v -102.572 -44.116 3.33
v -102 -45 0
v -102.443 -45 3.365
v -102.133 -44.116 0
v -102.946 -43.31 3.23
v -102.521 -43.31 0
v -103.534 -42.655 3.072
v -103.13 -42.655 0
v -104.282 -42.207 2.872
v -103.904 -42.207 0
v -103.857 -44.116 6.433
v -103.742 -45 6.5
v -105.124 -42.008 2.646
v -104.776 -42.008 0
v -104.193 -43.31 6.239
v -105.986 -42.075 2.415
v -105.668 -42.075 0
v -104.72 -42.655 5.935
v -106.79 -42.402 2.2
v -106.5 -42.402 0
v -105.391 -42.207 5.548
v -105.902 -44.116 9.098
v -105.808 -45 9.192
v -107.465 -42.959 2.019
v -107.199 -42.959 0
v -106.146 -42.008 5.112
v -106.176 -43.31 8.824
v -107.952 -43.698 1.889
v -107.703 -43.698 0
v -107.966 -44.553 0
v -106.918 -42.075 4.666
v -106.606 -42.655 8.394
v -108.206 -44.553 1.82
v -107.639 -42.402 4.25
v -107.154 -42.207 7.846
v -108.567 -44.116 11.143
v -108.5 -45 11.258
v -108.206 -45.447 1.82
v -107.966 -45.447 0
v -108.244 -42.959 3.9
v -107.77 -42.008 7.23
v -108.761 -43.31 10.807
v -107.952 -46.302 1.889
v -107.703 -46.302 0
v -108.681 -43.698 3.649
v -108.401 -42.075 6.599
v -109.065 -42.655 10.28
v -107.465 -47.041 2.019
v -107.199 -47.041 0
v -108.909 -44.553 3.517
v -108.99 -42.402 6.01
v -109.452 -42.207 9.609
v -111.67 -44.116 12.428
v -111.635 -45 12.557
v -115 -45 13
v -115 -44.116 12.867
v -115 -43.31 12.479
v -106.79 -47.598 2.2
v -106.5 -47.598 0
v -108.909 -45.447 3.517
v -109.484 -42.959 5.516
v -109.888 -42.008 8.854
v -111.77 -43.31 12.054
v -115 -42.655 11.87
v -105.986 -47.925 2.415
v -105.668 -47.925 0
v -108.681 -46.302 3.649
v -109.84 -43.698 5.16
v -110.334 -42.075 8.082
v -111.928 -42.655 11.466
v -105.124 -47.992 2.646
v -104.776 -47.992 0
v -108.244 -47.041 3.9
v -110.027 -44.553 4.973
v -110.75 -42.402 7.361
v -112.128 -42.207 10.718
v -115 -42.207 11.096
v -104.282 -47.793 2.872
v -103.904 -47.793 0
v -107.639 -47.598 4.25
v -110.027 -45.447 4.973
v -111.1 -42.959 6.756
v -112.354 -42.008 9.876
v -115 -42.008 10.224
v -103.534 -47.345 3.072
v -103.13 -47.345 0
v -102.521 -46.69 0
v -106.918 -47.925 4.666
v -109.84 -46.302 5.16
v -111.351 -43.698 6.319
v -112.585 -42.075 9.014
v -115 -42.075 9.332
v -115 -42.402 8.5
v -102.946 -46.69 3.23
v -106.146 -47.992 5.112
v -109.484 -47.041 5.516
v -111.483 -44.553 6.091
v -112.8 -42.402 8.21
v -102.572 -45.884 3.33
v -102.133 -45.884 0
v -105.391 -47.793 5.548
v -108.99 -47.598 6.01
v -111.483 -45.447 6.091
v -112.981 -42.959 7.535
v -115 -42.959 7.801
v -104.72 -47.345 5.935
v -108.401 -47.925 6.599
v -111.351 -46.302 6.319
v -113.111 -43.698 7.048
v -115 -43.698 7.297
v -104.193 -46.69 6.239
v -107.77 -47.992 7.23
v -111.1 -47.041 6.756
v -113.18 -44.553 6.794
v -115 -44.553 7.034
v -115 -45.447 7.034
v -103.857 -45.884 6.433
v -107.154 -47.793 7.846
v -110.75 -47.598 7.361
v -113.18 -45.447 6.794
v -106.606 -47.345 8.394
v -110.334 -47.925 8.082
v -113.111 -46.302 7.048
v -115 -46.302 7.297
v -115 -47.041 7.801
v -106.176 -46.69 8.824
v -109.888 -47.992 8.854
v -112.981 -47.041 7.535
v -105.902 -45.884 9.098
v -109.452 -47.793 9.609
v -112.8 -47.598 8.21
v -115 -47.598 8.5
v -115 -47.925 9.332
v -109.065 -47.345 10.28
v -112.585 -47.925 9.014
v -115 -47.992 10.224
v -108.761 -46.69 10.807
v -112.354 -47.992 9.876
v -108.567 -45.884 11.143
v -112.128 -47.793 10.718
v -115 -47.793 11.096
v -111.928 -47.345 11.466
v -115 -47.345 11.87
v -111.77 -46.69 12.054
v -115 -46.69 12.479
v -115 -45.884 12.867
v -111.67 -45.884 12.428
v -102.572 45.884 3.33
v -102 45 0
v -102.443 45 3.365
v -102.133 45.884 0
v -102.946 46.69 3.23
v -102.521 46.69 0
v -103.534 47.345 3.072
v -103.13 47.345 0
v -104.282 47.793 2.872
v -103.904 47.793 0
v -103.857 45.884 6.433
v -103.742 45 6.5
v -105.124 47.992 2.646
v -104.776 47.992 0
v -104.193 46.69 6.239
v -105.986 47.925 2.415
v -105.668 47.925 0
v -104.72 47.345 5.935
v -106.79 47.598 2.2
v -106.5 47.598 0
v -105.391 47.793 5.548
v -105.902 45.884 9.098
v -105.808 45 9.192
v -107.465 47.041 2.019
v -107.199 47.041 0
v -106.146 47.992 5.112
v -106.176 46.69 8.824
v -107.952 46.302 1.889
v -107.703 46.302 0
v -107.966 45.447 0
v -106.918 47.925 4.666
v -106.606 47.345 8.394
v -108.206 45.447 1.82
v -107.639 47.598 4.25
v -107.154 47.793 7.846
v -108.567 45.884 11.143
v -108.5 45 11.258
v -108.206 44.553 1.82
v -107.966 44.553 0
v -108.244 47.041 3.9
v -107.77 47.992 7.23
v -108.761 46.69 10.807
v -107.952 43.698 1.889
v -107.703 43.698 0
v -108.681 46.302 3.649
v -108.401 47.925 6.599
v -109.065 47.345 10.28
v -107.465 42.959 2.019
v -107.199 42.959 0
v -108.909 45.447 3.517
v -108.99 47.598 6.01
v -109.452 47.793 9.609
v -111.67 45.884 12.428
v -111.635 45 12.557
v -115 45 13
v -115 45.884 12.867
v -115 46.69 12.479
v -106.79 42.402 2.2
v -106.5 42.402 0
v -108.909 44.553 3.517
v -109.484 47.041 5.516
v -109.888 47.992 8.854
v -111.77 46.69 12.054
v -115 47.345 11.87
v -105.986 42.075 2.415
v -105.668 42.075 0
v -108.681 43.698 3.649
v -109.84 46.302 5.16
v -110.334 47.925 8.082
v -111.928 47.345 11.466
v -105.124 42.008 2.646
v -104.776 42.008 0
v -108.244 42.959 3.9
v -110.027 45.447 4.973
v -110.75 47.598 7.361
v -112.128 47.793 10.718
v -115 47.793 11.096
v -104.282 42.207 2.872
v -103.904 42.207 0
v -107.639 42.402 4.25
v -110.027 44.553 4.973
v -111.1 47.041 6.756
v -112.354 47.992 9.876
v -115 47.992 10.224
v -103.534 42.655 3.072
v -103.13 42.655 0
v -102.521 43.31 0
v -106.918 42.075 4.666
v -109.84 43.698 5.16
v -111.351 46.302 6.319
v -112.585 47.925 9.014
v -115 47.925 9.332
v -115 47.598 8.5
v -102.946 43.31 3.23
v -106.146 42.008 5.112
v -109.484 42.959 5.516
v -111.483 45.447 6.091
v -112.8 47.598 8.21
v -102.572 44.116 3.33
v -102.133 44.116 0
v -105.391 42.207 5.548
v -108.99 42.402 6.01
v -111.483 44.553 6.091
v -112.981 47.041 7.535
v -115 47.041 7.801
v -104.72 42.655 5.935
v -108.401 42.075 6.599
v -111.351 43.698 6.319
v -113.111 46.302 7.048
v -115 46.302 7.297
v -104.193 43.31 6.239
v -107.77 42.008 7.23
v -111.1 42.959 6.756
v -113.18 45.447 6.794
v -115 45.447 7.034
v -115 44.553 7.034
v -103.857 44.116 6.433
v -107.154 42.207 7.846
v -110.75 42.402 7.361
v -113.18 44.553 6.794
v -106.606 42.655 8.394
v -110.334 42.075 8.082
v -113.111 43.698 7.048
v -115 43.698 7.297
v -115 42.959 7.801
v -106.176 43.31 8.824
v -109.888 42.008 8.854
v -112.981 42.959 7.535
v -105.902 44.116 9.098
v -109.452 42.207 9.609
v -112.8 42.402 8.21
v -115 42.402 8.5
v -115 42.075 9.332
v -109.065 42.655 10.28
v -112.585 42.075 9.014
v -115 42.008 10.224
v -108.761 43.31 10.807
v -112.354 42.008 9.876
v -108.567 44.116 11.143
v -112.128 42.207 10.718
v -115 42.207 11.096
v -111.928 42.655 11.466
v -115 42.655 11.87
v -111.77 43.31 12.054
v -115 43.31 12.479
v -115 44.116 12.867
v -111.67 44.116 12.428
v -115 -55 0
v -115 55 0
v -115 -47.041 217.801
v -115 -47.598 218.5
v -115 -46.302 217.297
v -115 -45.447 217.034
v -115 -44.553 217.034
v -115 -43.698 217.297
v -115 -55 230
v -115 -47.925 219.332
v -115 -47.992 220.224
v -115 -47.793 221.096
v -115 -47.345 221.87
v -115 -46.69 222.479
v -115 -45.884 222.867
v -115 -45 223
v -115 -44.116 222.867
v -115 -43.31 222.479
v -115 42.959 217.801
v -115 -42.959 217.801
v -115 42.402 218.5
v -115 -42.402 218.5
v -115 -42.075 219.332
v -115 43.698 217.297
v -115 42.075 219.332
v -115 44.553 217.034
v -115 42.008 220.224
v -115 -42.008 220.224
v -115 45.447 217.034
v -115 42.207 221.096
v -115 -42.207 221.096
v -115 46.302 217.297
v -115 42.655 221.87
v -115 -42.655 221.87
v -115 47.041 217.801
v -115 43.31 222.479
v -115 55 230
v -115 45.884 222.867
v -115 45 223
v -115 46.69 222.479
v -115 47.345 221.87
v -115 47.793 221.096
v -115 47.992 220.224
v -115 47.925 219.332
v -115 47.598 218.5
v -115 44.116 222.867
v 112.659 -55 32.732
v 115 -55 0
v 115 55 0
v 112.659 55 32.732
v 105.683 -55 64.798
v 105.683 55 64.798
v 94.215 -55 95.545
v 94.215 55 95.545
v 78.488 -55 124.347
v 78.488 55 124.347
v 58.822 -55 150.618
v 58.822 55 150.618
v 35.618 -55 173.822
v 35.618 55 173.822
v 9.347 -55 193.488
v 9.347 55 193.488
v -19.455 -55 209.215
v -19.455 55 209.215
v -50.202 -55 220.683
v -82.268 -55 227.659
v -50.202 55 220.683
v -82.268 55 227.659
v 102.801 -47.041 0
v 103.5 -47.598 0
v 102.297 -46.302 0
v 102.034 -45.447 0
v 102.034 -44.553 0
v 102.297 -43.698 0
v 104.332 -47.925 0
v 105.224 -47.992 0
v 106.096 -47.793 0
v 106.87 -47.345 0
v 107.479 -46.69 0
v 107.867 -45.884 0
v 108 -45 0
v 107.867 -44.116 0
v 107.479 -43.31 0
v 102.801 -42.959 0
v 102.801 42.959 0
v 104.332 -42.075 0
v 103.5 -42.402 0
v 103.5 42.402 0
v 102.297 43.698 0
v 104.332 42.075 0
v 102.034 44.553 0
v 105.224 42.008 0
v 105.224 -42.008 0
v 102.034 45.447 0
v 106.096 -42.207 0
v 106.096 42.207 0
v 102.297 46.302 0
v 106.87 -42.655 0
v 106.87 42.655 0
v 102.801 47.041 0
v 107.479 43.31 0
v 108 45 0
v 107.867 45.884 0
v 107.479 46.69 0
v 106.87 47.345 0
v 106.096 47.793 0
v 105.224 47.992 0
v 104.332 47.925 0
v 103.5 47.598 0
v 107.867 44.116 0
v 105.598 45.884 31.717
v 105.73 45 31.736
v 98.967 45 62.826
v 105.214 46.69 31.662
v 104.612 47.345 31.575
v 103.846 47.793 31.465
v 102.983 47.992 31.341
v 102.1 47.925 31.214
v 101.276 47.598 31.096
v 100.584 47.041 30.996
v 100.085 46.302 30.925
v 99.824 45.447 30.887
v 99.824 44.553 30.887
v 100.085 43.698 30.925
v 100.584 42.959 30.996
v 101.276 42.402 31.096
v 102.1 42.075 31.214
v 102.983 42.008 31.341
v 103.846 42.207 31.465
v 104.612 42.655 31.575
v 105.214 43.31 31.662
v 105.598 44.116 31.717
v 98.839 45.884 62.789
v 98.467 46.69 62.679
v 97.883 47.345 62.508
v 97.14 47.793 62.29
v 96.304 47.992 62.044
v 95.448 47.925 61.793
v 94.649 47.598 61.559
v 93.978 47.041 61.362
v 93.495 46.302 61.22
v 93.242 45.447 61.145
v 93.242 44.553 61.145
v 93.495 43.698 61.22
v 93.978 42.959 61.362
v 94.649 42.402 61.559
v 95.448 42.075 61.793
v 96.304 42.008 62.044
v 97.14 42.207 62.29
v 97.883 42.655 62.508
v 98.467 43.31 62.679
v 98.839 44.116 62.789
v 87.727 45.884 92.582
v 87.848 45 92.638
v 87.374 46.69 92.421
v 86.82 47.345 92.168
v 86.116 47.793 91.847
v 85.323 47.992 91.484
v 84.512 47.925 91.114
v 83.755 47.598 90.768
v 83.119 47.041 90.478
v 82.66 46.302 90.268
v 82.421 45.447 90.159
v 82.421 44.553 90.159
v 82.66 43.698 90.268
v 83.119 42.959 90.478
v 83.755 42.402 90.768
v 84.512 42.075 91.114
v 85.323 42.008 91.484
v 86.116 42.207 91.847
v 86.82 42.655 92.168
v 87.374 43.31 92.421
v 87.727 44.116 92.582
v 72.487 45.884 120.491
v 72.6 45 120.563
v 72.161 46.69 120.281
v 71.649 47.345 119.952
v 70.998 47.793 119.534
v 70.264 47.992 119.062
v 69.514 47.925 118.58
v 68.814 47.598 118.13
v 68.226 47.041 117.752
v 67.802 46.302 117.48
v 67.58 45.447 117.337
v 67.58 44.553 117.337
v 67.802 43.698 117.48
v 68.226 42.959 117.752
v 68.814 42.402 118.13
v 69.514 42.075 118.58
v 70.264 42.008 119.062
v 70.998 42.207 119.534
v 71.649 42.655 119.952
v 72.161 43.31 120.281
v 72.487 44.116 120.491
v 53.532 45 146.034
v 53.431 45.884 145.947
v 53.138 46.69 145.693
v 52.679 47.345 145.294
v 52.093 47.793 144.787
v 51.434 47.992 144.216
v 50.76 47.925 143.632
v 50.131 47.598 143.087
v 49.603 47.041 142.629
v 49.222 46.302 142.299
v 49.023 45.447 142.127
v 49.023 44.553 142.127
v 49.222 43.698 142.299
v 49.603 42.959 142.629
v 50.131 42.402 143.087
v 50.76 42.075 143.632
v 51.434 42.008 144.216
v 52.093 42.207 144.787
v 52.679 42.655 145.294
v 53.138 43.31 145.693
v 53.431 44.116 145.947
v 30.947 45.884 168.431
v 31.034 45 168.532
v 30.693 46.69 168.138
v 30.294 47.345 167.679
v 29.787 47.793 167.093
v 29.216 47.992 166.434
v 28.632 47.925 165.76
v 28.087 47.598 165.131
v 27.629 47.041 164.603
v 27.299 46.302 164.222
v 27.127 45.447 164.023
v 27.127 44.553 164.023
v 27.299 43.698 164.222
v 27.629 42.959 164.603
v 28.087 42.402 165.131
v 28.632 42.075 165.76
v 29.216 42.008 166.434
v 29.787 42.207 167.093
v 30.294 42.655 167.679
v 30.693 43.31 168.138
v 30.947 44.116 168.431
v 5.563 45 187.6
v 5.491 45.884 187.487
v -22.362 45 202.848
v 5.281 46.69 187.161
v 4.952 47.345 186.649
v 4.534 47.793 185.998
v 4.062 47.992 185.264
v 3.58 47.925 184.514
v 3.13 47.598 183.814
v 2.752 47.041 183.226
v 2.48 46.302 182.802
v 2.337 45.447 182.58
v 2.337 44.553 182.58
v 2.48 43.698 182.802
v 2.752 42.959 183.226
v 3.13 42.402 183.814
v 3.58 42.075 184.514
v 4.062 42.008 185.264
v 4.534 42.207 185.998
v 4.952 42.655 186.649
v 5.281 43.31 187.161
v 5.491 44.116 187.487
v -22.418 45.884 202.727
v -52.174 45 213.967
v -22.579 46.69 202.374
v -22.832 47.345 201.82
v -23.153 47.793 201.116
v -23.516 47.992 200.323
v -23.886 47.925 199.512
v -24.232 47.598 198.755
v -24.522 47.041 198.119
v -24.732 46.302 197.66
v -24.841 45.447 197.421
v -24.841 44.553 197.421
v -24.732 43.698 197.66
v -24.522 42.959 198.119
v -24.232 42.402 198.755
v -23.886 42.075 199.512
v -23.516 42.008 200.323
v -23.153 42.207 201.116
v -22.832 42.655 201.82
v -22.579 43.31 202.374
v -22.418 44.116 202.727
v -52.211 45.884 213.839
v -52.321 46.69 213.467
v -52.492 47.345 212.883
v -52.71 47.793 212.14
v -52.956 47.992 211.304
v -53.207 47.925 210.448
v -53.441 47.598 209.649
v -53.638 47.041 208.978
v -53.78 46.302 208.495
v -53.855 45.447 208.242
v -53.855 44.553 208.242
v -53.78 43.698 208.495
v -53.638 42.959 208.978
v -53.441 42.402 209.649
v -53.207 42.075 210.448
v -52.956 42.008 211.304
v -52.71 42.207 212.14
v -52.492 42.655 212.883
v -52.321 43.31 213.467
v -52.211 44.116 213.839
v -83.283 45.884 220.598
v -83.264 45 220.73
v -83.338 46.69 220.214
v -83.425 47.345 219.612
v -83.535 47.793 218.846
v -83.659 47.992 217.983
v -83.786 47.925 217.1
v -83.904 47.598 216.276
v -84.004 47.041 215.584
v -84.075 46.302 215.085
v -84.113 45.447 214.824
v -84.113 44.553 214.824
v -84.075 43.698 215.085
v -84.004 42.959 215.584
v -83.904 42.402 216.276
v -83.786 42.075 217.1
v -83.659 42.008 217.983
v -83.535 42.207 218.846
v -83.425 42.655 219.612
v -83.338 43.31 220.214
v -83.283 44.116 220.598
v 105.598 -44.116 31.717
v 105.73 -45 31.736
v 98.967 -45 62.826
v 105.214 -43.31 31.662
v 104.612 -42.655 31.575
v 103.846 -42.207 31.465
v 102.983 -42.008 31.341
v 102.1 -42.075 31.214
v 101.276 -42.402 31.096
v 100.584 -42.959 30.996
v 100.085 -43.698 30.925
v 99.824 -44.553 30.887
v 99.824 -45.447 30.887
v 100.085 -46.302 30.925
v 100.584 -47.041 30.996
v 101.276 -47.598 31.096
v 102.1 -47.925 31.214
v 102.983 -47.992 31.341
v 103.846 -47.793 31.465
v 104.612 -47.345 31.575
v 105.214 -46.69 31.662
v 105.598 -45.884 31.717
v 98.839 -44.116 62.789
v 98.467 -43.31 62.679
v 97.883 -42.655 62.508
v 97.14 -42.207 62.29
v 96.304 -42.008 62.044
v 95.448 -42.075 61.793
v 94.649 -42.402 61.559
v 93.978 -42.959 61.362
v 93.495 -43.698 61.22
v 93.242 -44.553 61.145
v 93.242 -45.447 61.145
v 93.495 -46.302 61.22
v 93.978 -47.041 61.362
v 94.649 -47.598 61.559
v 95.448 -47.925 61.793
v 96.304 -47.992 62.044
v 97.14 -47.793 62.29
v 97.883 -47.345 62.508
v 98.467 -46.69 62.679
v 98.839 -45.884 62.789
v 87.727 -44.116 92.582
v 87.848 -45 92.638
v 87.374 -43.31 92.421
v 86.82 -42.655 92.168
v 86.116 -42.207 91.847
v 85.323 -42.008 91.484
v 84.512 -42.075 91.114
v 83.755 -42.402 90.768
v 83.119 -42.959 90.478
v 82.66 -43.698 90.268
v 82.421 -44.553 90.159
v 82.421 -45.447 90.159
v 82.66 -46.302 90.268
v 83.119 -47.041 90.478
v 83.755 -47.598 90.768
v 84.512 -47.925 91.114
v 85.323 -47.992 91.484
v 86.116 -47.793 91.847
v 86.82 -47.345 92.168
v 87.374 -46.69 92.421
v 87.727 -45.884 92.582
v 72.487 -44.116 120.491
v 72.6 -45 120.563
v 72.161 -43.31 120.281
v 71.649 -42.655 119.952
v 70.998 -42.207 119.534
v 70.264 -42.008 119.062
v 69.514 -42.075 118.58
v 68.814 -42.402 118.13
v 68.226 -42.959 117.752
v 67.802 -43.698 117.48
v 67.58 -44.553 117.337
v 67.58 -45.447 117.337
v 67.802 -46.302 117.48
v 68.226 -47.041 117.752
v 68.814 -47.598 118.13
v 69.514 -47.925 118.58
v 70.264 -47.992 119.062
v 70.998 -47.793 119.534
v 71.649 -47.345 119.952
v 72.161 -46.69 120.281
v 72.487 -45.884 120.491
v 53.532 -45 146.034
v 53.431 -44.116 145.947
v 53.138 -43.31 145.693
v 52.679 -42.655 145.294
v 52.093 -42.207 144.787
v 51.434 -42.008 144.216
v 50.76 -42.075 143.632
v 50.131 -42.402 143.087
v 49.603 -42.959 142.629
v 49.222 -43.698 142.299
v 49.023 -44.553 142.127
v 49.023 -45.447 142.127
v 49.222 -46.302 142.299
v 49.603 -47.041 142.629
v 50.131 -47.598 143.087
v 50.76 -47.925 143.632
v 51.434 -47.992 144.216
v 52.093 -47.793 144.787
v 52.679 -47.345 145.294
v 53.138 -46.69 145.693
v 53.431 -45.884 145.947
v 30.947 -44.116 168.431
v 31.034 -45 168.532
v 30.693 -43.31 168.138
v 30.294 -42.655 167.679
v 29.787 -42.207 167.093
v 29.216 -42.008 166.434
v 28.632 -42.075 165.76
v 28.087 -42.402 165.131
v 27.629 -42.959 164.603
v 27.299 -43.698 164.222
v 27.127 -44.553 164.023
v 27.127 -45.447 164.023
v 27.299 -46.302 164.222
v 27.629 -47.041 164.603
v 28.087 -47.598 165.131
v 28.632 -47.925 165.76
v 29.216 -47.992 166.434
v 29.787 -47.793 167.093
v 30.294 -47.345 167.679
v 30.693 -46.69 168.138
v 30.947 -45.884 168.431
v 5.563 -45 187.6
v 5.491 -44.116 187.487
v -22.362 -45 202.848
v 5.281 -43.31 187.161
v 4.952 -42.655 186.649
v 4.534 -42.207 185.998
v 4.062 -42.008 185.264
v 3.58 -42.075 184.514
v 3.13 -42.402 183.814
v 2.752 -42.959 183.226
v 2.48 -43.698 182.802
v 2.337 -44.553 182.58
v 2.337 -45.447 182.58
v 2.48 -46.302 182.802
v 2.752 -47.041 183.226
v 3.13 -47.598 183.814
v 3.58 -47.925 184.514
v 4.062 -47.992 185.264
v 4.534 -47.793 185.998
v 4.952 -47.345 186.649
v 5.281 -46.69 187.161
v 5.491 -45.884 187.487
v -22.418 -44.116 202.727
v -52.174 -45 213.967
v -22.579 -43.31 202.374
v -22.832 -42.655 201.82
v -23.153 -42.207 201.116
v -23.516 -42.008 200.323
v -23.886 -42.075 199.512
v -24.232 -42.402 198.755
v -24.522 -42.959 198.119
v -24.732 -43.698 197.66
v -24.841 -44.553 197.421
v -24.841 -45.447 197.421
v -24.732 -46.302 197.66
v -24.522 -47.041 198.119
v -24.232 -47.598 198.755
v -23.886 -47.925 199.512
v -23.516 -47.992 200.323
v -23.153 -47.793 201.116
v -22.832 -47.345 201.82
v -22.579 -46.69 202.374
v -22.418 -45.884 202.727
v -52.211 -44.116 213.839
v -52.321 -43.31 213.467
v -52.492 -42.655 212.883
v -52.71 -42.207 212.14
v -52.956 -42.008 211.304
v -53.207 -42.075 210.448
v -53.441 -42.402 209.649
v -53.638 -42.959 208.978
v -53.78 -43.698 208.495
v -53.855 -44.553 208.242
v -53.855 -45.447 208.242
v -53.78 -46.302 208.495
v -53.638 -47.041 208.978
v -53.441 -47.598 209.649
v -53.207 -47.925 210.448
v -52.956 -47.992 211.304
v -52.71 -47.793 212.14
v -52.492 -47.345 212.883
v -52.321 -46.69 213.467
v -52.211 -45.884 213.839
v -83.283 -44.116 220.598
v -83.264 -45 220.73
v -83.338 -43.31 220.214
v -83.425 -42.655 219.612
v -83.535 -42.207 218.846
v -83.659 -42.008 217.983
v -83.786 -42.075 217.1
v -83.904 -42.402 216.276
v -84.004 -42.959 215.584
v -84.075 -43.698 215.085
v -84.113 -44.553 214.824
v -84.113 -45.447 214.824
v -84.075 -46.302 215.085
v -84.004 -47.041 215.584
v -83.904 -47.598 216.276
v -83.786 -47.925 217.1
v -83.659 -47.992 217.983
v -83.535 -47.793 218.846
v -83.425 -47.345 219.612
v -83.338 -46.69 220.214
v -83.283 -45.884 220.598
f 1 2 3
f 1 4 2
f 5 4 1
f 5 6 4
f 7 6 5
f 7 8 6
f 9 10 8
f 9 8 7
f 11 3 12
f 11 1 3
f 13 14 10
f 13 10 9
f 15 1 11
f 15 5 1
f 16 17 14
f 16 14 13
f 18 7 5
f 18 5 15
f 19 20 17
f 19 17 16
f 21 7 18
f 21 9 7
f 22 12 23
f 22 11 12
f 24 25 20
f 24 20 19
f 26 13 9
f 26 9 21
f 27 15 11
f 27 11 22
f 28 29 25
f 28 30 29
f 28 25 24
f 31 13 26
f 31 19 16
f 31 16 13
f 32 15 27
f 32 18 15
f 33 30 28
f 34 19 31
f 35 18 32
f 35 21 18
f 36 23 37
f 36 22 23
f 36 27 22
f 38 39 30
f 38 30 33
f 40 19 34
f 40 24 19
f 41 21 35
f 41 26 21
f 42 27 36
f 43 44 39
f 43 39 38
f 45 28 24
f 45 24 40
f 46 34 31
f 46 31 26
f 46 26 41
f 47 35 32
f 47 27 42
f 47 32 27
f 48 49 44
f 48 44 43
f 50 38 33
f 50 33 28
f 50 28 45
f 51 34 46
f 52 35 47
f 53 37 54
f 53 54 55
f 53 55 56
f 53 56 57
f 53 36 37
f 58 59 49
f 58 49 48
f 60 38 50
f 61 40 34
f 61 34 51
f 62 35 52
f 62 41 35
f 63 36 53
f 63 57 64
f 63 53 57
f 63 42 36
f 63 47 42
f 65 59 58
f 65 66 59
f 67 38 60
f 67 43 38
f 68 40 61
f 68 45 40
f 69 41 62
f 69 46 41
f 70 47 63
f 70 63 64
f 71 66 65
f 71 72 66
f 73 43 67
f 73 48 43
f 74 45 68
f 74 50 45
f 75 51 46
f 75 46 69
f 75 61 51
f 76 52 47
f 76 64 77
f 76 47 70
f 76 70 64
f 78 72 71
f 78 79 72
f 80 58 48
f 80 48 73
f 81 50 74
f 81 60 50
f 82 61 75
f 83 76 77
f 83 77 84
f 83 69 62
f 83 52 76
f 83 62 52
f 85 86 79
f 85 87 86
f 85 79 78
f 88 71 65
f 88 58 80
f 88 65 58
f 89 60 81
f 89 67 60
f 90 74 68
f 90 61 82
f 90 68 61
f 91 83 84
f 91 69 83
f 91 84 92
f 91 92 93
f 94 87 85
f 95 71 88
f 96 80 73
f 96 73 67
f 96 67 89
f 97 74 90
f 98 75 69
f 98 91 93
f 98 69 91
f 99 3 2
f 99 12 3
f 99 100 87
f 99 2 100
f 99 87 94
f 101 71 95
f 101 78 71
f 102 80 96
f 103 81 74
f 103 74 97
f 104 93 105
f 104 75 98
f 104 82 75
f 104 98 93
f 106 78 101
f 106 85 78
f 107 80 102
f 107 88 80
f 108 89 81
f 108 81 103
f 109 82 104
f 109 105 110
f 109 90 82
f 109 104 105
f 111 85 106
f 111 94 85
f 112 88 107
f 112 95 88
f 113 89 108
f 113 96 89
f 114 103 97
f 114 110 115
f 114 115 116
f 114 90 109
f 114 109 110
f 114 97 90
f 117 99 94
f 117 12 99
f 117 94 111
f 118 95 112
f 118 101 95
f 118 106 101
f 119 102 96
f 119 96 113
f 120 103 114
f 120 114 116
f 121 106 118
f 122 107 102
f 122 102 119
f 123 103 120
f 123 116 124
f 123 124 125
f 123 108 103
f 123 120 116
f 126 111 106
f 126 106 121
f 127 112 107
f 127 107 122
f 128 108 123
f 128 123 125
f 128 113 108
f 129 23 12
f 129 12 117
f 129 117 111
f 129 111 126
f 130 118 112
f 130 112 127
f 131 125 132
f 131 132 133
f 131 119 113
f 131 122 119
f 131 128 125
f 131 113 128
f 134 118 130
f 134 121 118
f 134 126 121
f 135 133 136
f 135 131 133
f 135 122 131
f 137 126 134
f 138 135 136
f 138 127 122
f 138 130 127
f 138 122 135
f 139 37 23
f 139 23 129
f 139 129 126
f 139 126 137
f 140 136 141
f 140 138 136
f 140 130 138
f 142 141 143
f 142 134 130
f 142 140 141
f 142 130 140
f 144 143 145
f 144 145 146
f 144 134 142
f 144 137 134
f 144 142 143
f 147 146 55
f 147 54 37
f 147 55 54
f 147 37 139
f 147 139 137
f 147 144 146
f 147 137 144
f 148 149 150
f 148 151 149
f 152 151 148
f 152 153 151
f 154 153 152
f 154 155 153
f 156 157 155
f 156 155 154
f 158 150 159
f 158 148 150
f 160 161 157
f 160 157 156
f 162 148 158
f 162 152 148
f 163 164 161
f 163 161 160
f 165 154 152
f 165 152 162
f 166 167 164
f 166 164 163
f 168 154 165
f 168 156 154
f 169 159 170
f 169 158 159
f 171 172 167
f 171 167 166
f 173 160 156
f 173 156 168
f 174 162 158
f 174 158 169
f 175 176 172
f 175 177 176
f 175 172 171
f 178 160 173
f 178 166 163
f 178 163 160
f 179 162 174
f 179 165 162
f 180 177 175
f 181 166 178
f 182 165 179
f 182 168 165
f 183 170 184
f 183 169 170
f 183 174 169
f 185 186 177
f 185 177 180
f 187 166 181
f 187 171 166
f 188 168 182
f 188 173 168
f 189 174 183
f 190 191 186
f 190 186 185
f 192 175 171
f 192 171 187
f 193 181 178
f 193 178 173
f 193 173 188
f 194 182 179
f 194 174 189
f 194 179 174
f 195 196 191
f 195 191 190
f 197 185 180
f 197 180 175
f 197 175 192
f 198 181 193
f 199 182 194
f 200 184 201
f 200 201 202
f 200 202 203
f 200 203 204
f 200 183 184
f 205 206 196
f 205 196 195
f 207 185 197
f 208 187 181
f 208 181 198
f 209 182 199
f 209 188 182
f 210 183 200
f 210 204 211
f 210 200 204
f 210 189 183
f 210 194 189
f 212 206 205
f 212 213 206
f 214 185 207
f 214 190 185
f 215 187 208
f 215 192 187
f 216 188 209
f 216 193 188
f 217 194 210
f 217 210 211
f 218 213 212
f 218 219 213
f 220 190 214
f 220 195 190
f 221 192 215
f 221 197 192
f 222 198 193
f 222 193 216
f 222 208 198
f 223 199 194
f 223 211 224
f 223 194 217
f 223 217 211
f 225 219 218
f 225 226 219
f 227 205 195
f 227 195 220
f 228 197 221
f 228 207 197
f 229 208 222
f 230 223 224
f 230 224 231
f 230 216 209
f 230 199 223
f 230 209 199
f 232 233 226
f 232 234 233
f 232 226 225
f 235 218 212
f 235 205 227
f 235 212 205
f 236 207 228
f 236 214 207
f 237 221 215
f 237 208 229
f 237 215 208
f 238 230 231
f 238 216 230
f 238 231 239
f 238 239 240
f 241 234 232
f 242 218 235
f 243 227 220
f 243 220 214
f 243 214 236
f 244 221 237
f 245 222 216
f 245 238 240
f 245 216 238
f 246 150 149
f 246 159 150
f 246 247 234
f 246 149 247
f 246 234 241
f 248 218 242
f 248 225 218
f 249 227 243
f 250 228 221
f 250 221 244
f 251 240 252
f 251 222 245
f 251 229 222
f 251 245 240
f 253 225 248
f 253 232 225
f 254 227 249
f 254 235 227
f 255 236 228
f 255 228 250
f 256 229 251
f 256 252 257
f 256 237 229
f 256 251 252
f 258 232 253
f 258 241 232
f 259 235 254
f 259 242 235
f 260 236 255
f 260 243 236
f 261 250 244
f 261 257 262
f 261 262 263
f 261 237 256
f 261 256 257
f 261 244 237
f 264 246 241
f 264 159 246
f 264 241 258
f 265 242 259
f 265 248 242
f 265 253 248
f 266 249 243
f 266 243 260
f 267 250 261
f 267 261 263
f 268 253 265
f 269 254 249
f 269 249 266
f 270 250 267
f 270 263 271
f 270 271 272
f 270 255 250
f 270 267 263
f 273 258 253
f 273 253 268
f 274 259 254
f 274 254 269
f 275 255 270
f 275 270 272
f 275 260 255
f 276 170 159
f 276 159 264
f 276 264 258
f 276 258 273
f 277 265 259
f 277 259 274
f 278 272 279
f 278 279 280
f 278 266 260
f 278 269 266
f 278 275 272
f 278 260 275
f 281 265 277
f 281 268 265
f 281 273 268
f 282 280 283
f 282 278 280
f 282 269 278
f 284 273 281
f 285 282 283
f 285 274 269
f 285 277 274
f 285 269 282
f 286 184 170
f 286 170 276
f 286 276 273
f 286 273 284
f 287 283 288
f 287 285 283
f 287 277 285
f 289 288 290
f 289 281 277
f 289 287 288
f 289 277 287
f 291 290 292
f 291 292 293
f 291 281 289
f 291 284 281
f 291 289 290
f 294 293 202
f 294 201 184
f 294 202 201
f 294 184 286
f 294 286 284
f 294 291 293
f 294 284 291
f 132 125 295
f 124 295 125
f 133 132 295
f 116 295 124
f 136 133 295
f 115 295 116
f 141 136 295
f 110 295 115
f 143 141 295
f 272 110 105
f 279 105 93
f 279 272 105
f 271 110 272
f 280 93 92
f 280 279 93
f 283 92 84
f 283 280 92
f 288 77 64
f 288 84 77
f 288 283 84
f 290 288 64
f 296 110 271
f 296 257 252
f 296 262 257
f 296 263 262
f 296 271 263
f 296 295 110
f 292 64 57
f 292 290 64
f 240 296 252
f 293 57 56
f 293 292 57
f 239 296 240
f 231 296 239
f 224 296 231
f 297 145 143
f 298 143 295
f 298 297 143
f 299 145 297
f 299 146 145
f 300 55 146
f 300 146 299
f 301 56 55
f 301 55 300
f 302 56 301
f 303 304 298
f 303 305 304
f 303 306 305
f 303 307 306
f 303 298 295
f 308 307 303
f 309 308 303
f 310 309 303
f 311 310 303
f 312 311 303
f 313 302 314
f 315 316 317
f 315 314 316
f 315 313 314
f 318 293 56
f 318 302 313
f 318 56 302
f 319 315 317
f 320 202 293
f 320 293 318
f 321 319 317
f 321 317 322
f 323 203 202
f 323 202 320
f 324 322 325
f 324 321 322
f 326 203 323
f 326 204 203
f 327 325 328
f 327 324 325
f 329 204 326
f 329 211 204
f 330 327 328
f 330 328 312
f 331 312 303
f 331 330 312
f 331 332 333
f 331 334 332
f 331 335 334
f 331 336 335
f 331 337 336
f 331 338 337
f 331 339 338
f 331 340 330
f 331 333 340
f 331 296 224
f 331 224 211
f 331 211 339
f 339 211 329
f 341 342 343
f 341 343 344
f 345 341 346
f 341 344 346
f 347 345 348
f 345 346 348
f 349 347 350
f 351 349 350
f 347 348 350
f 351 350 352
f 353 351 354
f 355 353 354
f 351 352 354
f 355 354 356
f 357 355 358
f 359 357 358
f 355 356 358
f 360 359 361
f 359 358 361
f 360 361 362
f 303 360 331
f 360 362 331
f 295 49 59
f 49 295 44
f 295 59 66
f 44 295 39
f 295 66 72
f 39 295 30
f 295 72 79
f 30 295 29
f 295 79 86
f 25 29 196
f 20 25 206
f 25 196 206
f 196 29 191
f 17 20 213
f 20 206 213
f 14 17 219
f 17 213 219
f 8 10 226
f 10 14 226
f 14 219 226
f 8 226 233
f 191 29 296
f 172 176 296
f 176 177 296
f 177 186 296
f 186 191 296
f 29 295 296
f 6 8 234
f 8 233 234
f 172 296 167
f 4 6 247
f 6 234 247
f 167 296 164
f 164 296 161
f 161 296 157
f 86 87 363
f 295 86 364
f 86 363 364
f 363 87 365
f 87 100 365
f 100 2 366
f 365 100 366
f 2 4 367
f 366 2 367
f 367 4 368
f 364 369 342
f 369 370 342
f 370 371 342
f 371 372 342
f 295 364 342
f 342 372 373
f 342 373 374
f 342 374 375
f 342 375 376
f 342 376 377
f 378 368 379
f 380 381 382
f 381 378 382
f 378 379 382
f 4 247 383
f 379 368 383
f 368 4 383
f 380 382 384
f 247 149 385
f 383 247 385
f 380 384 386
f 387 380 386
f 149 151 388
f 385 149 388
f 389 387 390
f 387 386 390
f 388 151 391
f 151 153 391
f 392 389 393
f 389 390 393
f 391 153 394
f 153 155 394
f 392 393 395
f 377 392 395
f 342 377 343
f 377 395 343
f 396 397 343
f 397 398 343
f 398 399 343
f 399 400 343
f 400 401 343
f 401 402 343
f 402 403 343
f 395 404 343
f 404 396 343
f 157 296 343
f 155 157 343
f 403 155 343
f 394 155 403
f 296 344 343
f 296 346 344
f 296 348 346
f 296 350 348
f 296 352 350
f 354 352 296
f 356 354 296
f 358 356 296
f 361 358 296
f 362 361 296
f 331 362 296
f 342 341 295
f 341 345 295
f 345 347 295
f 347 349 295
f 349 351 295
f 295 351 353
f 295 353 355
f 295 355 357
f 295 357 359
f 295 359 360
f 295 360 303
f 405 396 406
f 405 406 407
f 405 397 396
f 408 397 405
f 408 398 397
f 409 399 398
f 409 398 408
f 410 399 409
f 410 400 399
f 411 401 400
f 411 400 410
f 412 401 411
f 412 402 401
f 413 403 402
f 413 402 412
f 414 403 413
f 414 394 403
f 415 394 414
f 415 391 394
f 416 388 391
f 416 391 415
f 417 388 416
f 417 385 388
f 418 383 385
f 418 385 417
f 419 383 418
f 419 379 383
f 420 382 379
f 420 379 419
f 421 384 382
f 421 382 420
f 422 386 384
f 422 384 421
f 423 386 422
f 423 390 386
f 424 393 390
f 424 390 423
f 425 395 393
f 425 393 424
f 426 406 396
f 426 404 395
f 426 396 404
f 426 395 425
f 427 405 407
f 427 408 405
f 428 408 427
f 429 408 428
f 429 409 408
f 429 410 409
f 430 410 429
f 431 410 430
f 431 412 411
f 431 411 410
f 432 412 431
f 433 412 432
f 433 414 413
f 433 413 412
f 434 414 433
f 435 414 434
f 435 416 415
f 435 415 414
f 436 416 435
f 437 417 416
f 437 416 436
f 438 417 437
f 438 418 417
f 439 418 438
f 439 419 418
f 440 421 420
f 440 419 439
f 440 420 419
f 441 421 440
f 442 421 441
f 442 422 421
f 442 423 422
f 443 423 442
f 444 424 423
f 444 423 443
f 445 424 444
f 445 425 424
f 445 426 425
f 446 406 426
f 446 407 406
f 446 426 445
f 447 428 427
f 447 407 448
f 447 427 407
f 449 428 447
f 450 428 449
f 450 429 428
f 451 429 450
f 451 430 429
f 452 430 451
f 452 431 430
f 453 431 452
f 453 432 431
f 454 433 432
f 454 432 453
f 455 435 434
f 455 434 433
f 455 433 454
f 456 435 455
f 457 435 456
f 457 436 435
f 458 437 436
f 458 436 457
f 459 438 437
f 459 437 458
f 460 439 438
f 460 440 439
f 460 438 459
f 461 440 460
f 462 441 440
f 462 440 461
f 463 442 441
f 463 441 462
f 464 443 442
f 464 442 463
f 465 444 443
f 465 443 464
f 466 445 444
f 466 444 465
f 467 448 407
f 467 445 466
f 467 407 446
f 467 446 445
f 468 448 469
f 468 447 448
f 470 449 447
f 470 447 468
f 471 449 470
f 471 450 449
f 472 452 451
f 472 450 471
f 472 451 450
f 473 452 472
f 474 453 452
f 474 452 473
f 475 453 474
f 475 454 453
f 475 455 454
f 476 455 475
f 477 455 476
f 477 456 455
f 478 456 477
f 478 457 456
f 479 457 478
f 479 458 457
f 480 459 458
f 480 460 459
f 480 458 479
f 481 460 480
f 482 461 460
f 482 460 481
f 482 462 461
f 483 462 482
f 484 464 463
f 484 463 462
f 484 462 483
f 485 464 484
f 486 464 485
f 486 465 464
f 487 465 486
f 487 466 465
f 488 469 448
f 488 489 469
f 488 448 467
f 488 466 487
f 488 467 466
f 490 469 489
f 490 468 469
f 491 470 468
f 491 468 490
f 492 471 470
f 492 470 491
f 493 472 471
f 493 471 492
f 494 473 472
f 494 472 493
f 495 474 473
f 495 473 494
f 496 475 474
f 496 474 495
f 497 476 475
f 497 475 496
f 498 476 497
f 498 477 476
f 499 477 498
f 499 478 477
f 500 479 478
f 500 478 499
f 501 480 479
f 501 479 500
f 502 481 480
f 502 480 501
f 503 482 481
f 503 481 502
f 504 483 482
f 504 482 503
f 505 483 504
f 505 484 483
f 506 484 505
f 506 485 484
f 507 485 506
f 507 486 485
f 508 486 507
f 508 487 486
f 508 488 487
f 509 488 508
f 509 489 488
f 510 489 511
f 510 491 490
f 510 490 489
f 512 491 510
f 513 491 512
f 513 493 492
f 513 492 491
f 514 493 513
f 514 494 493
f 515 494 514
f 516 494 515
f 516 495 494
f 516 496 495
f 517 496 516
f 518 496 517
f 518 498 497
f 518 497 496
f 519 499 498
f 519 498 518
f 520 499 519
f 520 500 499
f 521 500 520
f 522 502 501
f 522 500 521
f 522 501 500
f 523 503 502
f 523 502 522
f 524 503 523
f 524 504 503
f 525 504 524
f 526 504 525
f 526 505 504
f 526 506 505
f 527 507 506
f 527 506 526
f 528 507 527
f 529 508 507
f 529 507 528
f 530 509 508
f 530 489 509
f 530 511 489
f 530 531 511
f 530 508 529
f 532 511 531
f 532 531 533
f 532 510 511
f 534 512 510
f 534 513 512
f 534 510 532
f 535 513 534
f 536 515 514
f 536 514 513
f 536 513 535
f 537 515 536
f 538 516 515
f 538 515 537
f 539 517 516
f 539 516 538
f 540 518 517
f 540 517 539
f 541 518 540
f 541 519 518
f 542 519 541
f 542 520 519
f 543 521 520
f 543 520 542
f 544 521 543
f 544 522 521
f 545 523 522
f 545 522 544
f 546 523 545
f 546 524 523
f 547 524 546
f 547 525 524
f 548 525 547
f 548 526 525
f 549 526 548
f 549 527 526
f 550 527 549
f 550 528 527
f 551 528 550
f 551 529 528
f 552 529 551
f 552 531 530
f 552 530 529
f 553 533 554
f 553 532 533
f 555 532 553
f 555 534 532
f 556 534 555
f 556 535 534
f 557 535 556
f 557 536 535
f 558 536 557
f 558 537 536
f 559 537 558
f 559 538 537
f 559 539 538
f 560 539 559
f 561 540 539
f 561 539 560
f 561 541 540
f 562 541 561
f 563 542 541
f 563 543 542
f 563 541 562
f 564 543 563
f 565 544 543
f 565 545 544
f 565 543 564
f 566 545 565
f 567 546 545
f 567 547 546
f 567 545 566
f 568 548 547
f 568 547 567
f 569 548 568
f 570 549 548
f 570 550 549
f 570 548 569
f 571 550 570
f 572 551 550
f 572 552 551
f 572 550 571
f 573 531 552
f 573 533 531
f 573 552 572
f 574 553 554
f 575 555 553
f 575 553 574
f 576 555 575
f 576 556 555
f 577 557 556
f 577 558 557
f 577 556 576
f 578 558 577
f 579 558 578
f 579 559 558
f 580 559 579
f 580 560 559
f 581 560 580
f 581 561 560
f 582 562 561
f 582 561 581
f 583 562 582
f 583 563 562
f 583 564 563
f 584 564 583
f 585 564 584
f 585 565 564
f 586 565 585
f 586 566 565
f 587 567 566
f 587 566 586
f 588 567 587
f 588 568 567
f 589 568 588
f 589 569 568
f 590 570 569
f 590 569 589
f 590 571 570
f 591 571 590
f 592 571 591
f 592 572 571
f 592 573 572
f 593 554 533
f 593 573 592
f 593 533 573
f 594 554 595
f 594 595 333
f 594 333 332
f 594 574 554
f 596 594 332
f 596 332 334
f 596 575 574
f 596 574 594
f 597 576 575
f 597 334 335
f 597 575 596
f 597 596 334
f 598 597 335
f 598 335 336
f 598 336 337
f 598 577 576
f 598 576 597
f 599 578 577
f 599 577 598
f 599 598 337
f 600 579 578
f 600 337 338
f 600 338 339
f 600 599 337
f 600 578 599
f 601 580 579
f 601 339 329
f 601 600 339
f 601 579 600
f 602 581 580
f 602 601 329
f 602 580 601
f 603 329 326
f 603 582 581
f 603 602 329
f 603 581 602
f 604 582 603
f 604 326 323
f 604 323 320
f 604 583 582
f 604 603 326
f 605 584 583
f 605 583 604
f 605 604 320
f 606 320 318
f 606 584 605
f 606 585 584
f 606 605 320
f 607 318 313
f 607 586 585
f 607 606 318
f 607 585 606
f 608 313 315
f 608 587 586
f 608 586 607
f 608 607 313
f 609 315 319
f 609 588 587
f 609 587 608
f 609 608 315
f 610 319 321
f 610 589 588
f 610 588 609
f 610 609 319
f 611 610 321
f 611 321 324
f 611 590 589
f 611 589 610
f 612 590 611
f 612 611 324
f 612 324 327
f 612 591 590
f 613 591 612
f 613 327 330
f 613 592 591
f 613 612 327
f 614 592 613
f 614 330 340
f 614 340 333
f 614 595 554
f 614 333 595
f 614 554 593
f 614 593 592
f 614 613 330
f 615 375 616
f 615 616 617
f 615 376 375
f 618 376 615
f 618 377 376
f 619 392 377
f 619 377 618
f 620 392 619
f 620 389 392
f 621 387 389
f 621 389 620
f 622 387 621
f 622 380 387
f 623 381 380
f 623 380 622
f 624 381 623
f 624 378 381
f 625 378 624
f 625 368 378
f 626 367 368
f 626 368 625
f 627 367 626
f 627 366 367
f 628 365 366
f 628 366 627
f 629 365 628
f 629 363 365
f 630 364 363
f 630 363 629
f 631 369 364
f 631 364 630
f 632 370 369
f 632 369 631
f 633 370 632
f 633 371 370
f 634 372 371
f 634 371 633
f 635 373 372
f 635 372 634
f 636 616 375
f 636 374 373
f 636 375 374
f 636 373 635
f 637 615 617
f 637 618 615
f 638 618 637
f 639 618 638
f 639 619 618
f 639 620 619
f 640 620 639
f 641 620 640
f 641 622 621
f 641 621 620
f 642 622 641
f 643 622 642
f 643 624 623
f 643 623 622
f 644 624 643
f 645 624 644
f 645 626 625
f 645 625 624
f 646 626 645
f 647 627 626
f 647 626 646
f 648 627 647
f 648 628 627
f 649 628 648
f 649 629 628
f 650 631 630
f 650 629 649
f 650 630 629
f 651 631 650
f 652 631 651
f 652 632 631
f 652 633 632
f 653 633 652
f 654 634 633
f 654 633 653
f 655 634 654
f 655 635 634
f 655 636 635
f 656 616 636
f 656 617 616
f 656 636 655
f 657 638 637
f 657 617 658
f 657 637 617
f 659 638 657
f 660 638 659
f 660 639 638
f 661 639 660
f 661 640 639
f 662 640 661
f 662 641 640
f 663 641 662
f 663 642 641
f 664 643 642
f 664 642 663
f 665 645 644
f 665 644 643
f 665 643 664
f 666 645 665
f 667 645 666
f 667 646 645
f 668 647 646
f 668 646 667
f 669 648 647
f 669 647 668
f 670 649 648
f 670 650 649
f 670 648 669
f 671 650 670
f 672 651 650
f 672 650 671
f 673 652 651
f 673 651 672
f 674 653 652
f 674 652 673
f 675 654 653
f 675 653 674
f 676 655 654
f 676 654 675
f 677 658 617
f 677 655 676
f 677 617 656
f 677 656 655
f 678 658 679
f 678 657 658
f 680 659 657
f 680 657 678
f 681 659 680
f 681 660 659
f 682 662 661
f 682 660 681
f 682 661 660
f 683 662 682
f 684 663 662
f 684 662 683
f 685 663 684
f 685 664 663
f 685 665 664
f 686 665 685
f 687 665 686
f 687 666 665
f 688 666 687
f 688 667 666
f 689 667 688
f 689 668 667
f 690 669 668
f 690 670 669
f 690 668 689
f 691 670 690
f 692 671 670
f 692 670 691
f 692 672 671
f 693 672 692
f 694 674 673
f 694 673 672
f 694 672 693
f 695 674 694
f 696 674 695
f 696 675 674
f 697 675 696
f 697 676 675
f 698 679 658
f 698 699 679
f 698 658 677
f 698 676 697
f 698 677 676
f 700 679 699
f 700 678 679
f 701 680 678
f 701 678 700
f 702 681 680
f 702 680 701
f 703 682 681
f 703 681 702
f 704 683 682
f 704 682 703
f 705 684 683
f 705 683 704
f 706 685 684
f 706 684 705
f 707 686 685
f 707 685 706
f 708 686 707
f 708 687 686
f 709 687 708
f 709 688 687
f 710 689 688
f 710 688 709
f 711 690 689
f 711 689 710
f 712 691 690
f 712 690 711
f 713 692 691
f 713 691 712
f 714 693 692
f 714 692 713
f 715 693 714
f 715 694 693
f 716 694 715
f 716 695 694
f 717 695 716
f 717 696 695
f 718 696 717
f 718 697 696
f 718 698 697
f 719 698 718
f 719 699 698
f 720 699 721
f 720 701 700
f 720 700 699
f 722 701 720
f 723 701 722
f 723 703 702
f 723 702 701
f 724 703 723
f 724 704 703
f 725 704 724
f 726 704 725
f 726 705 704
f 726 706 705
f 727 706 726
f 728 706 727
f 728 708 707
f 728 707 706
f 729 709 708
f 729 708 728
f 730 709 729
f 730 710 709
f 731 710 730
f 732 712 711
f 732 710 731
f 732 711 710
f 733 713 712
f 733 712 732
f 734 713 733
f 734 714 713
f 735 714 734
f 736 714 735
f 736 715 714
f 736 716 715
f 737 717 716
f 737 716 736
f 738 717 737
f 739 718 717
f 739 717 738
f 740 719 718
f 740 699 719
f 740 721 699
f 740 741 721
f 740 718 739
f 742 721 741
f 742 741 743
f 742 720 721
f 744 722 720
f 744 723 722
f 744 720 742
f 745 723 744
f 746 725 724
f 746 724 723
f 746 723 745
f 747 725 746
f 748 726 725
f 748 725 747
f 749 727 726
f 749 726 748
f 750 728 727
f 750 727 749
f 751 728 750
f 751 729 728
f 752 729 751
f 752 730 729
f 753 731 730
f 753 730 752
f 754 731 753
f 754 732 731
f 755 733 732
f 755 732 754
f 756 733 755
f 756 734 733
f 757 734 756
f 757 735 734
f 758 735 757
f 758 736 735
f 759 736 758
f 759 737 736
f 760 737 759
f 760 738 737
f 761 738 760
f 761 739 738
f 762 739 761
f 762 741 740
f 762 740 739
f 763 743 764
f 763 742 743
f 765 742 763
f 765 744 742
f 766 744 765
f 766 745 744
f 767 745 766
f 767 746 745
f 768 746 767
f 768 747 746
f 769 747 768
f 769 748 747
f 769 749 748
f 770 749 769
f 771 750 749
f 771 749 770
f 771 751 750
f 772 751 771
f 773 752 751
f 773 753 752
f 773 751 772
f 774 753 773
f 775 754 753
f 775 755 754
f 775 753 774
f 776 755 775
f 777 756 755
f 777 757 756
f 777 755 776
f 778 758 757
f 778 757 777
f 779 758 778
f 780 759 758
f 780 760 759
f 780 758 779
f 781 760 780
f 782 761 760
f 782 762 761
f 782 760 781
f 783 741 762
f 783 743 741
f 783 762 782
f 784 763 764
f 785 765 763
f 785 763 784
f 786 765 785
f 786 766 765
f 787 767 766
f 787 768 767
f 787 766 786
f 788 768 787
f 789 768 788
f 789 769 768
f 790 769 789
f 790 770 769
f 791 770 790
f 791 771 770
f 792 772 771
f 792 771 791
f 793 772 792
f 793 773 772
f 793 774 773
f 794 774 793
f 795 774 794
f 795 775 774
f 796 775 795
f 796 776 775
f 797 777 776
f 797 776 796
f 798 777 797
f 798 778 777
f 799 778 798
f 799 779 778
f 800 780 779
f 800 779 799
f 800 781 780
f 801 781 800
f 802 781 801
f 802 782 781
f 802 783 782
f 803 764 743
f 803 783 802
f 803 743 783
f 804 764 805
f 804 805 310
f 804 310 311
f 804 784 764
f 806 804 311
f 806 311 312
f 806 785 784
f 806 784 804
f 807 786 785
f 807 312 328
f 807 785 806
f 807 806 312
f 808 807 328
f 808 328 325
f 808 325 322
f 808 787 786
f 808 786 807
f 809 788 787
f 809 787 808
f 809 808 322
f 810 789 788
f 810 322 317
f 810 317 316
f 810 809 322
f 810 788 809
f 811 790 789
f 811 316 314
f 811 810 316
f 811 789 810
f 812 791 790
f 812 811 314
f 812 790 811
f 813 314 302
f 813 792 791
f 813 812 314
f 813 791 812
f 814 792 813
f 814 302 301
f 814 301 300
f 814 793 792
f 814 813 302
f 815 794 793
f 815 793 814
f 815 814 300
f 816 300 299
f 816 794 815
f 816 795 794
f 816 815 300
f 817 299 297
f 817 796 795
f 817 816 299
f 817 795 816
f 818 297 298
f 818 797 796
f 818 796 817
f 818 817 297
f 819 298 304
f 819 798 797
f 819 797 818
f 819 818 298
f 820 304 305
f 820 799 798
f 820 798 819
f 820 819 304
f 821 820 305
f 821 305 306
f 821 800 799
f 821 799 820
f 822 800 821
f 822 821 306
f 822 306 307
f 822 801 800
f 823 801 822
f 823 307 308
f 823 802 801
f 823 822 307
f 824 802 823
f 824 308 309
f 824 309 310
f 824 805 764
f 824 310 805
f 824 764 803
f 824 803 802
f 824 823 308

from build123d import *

# Parameters (mm, degrees)
SKETCH_1_W      = 230
SKETCH_1_H      = 110
SKETCH_1_R      = 3
REVOLVE_1_ANGLE = 90


with BuildPart() as part:
    # 草图1 → 旋转1 (revolve)
    with BuildSketch(Plane.XY):
        Rectangle(SKETCH_1_W, SKETCH_1_H)
        with Locations((-105, 45)):
            Circle(SKETCH_1_R, mode=Mode.SUBTRACT)
        with Locations((-105, -45)):
            Circle(SKETCH_1_R, mode=Mode.SUBTRACT)
        with Locations((105, -45)):
            Circle(SKETCH_1_R, mode=Mode.SUBTRACT)
        with Locations((105, 45)):
            Circle(SKETCH_1_R, mode=Mode.SUBTRACT)
    revolve(axis=Axis((-115, 55, 0), (0, -1, 0)), revolution_arc=REVOLVE_1_ANGLE)


solid = part.part
